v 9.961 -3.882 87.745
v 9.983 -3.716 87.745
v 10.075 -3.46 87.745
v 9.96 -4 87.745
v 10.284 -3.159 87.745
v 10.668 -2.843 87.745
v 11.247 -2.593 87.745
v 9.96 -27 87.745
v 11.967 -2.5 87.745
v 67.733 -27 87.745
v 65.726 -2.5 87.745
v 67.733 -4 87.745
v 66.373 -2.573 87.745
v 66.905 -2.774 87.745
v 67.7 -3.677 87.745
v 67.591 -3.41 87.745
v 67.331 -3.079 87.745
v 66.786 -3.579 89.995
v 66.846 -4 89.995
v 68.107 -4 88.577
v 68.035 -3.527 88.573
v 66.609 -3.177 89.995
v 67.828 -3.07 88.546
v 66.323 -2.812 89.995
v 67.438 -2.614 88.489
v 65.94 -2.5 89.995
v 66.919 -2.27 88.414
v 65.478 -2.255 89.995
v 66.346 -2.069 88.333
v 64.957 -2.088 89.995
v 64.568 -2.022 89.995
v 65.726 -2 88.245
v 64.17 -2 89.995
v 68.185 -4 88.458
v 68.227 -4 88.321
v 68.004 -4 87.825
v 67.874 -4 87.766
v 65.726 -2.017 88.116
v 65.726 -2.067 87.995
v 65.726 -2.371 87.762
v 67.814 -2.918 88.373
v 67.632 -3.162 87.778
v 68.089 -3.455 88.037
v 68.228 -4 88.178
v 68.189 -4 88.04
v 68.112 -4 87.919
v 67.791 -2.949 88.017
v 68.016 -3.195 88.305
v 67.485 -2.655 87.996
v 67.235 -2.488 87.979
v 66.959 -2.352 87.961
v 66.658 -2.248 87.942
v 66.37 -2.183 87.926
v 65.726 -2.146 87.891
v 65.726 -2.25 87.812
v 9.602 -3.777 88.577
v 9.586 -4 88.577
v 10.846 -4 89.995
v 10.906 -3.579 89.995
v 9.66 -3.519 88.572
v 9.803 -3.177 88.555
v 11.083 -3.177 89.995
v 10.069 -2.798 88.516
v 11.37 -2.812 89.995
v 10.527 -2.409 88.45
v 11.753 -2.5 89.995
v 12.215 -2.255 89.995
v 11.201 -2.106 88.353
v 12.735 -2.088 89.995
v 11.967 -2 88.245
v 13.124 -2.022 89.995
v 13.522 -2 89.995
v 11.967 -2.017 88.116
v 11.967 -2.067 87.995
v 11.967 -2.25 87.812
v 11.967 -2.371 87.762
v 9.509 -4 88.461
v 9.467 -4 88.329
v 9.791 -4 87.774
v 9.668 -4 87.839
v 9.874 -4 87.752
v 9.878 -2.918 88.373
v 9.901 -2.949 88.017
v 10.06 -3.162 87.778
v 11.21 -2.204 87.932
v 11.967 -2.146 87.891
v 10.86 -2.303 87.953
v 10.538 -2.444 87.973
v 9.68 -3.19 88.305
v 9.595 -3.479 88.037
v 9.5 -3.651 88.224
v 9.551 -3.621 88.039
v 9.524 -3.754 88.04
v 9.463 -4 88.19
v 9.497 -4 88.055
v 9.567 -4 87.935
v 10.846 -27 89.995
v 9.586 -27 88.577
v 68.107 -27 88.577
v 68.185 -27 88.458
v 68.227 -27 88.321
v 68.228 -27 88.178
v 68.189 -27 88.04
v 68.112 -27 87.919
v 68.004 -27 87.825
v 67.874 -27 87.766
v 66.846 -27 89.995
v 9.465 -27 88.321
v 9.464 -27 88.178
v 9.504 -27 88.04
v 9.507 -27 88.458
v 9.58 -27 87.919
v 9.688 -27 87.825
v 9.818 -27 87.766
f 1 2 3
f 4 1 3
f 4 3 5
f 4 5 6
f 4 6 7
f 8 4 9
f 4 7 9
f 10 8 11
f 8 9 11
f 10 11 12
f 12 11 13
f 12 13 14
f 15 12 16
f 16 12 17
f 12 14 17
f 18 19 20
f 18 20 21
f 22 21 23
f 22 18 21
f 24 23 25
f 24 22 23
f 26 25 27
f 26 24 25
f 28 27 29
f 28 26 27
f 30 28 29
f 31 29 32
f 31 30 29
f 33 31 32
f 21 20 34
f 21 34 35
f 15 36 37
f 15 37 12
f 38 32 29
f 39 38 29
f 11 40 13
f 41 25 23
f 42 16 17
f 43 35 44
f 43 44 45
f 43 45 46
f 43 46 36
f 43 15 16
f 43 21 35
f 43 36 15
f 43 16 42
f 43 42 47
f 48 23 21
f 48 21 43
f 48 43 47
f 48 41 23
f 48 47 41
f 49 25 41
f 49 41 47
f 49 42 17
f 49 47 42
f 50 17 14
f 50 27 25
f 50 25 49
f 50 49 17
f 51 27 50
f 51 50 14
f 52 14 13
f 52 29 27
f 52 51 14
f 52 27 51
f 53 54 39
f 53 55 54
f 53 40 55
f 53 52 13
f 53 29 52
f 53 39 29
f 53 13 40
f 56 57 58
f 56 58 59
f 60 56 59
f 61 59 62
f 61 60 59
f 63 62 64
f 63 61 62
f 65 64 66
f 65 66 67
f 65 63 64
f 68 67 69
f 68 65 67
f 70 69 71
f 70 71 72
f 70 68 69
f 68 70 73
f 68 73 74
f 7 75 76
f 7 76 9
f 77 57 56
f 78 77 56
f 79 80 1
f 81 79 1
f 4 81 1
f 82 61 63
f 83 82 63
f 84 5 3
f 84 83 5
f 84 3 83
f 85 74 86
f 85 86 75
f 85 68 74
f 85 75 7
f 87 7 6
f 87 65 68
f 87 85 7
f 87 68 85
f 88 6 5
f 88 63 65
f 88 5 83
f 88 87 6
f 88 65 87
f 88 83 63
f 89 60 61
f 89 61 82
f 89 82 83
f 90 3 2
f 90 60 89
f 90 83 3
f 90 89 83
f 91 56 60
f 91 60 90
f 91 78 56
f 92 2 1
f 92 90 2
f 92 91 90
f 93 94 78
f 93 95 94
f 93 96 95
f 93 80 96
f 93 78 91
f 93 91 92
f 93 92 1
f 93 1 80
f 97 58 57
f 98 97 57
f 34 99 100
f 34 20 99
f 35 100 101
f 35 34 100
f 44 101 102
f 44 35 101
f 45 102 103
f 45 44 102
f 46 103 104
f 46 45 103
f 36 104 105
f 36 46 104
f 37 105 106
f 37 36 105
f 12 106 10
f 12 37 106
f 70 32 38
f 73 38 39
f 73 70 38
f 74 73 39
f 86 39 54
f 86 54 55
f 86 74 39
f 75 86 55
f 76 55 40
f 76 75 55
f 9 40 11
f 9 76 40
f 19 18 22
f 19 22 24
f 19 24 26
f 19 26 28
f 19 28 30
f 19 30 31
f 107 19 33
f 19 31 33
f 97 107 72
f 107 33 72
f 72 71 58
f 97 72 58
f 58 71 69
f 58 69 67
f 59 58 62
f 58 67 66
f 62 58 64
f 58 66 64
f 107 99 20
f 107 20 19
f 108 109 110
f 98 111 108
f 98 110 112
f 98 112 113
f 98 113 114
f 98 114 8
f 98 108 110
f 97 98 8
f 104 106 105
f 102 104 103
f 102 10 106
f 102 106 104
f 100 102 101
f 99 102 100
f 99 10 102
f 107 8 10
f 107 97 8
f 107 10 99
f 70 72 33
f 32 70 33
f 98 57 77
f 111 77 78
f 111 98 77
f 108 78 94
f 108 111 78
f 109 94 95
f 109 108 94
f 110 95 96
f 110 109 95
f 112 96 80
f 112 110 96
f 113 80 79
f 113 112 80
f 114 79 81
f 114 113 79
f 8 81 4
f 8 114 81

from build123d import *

# Parameters (mm, degrees)
EXTRUDE013_DEPTH = 25
FILLET039_R      = 2
FILLET040_R      = 0.5


with BuildPart() as part:
    # Sketch018 → Extrude013 (new body)
    with BuildSketch(Plane.XZ):
        Polygon((10.846248, 101.175052), (8.846248, 98.925052), (68.846248, 98.925052), (66.846248, 101.175052), align=None)
    extrude(amount=EXTRUDE013_DEPTH)


with BuildPart() as part_1:
    # Extrude013 placement: moved
    add(part.part.moved(Location((0.5, -6.5, 0))))

    # Fillet039
    fillet039_edges = [part_1.edges().sort_by_distance(p)[0] for p in [
        (10.346248, -6.5, 100.050052),
        (68.346248, -6.5, 100.050052),
    ]]
    fillet(fillet039_edges, radius=FILLET039_R)

    # Fillet040
    fillet040_edges = [part_1.edges().sort_by_distance(p)[0] for p in [
        (9.346248, -20, 98.925052),
        (69.346248, -20, 98.925052),
    ]]
    fillet(fillet040_edges, radius=FILLET040_R)


with BuildPart() as part_2:
    # Fillet040 placement: moved
    add(part_1.part.moved(Location((-0.5, 4.5, -11.18))))


solid = part_2.part
